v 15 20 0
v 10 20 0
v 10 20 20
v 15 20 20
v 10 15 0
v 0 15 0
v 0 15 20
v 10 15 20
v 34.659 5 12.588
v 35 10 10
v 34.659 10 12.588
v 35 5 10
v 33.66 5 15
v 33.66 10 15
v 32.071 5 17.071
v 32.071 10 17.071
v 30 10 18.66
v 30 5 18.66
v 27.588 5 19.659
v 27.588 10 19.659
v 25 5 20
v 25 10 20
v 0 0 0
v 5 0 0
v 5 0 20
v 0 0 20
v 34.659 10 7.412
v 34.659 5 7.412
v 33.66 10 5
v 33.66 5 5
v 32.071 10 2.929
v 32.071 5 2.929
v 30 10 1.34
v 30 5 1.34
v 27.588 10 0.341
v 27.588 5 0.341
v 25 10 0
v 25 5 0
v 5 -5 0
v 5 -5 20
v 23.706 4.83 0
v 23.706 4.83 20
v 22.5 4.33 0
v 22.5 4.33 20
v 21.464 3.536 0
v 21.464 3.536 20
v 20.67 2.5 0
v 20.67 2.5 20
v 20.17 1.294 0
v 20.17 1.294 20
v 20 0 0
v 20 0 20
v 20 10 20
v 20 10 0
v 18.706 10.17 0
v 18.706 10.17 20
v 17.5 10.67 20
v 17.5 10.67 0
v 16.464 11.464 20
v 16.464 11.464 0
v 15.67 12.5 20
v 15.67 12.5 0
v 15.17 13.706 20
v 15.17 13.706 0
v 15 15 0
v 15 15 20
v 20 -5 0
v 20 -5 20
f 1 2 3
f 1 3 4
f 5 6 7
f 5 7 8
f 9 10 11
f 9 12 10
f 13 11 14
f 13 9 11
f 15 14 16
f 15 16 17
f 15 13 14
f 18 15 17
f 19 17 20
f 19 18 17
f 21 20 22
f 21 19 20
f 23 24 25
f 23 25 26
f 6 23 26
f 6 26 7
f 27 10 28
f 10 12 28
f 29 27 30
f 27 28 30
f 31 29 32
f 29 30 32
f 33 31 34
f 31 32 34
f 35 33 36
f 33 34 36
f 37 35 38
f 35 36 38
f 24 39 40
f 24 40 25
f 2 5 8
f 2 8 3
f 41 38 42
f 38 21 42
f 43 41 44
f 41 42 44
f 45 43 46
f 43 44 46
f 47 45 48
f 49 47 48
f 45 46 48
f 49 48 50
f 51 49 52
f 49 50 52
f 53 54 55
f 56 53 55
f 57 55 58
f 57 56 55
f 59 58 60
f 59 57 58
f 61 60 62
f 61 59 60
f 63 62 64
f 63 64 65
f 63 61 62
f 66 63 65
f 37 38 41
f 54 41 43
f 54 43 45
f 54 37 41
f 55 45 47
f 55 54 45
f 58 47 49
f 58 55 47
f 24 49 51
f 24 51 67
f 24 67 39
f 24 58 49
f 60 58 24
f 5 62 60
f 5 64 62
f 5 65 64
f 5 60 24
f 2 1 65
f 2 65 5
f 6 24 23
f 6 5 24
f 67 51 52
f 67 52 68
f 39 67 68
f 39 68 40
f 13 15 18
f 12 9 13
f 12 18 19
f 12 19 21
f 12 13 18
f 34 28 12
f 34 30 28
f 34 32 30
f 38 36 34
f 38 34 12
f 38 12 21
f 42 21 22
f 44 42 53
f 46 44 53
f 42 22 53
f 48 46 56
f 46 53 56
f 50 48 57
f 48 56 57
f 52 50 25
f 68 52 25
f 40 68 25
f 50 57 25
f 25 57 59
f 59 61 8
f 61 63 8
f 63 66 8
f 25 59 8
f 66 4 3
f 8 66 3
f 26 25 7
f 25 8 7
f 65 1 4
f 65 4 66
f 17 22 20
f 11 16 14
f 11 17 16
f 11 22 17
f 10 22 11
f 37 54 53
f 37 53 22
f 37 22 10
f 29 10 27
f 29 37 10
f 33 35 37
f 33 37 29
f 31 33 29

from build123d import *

# Parameters (mm, degrees)
EXTRUDE_1_DEPTH = 20
FILLET_2_R      = 10
FILLET_1_R      = 5


with BuildPart() as part:
    # 草圖1 → 填料-伸長1 (new body)
    with BuildSketch(Plane.XY):
        Polygon((0, 0), (0, 15), (10, 15), (10, 20), (15, 20), (15, 10), (35, 10), (35, 5), (20, 5), (20, -5), (5, -5), (5, 0), align=None)
    extrude(amount=EXTRUDE_1_DEPTH)

    # 圓角2
    fillet_2_edges = [part.edges().sort_by_distance(p)[0] for p in [
        (35, 7.5, 0),
        (35, 7.5, 20),
    ]]
    fillet(fillet_2_edges, radius=FILLET_2_R - 0.0001)  # a hair under: the kernel refuses the full size

    # 圓角1
    fillet_1_edges = [part.edges().sort_by_distance(p)[0] for p in [
        (20, 5, 10),
        (15, 10, 10),
    ]]
    fillet(fillet_1_edges, radius=FILLET_1_R)


solid = part.part
